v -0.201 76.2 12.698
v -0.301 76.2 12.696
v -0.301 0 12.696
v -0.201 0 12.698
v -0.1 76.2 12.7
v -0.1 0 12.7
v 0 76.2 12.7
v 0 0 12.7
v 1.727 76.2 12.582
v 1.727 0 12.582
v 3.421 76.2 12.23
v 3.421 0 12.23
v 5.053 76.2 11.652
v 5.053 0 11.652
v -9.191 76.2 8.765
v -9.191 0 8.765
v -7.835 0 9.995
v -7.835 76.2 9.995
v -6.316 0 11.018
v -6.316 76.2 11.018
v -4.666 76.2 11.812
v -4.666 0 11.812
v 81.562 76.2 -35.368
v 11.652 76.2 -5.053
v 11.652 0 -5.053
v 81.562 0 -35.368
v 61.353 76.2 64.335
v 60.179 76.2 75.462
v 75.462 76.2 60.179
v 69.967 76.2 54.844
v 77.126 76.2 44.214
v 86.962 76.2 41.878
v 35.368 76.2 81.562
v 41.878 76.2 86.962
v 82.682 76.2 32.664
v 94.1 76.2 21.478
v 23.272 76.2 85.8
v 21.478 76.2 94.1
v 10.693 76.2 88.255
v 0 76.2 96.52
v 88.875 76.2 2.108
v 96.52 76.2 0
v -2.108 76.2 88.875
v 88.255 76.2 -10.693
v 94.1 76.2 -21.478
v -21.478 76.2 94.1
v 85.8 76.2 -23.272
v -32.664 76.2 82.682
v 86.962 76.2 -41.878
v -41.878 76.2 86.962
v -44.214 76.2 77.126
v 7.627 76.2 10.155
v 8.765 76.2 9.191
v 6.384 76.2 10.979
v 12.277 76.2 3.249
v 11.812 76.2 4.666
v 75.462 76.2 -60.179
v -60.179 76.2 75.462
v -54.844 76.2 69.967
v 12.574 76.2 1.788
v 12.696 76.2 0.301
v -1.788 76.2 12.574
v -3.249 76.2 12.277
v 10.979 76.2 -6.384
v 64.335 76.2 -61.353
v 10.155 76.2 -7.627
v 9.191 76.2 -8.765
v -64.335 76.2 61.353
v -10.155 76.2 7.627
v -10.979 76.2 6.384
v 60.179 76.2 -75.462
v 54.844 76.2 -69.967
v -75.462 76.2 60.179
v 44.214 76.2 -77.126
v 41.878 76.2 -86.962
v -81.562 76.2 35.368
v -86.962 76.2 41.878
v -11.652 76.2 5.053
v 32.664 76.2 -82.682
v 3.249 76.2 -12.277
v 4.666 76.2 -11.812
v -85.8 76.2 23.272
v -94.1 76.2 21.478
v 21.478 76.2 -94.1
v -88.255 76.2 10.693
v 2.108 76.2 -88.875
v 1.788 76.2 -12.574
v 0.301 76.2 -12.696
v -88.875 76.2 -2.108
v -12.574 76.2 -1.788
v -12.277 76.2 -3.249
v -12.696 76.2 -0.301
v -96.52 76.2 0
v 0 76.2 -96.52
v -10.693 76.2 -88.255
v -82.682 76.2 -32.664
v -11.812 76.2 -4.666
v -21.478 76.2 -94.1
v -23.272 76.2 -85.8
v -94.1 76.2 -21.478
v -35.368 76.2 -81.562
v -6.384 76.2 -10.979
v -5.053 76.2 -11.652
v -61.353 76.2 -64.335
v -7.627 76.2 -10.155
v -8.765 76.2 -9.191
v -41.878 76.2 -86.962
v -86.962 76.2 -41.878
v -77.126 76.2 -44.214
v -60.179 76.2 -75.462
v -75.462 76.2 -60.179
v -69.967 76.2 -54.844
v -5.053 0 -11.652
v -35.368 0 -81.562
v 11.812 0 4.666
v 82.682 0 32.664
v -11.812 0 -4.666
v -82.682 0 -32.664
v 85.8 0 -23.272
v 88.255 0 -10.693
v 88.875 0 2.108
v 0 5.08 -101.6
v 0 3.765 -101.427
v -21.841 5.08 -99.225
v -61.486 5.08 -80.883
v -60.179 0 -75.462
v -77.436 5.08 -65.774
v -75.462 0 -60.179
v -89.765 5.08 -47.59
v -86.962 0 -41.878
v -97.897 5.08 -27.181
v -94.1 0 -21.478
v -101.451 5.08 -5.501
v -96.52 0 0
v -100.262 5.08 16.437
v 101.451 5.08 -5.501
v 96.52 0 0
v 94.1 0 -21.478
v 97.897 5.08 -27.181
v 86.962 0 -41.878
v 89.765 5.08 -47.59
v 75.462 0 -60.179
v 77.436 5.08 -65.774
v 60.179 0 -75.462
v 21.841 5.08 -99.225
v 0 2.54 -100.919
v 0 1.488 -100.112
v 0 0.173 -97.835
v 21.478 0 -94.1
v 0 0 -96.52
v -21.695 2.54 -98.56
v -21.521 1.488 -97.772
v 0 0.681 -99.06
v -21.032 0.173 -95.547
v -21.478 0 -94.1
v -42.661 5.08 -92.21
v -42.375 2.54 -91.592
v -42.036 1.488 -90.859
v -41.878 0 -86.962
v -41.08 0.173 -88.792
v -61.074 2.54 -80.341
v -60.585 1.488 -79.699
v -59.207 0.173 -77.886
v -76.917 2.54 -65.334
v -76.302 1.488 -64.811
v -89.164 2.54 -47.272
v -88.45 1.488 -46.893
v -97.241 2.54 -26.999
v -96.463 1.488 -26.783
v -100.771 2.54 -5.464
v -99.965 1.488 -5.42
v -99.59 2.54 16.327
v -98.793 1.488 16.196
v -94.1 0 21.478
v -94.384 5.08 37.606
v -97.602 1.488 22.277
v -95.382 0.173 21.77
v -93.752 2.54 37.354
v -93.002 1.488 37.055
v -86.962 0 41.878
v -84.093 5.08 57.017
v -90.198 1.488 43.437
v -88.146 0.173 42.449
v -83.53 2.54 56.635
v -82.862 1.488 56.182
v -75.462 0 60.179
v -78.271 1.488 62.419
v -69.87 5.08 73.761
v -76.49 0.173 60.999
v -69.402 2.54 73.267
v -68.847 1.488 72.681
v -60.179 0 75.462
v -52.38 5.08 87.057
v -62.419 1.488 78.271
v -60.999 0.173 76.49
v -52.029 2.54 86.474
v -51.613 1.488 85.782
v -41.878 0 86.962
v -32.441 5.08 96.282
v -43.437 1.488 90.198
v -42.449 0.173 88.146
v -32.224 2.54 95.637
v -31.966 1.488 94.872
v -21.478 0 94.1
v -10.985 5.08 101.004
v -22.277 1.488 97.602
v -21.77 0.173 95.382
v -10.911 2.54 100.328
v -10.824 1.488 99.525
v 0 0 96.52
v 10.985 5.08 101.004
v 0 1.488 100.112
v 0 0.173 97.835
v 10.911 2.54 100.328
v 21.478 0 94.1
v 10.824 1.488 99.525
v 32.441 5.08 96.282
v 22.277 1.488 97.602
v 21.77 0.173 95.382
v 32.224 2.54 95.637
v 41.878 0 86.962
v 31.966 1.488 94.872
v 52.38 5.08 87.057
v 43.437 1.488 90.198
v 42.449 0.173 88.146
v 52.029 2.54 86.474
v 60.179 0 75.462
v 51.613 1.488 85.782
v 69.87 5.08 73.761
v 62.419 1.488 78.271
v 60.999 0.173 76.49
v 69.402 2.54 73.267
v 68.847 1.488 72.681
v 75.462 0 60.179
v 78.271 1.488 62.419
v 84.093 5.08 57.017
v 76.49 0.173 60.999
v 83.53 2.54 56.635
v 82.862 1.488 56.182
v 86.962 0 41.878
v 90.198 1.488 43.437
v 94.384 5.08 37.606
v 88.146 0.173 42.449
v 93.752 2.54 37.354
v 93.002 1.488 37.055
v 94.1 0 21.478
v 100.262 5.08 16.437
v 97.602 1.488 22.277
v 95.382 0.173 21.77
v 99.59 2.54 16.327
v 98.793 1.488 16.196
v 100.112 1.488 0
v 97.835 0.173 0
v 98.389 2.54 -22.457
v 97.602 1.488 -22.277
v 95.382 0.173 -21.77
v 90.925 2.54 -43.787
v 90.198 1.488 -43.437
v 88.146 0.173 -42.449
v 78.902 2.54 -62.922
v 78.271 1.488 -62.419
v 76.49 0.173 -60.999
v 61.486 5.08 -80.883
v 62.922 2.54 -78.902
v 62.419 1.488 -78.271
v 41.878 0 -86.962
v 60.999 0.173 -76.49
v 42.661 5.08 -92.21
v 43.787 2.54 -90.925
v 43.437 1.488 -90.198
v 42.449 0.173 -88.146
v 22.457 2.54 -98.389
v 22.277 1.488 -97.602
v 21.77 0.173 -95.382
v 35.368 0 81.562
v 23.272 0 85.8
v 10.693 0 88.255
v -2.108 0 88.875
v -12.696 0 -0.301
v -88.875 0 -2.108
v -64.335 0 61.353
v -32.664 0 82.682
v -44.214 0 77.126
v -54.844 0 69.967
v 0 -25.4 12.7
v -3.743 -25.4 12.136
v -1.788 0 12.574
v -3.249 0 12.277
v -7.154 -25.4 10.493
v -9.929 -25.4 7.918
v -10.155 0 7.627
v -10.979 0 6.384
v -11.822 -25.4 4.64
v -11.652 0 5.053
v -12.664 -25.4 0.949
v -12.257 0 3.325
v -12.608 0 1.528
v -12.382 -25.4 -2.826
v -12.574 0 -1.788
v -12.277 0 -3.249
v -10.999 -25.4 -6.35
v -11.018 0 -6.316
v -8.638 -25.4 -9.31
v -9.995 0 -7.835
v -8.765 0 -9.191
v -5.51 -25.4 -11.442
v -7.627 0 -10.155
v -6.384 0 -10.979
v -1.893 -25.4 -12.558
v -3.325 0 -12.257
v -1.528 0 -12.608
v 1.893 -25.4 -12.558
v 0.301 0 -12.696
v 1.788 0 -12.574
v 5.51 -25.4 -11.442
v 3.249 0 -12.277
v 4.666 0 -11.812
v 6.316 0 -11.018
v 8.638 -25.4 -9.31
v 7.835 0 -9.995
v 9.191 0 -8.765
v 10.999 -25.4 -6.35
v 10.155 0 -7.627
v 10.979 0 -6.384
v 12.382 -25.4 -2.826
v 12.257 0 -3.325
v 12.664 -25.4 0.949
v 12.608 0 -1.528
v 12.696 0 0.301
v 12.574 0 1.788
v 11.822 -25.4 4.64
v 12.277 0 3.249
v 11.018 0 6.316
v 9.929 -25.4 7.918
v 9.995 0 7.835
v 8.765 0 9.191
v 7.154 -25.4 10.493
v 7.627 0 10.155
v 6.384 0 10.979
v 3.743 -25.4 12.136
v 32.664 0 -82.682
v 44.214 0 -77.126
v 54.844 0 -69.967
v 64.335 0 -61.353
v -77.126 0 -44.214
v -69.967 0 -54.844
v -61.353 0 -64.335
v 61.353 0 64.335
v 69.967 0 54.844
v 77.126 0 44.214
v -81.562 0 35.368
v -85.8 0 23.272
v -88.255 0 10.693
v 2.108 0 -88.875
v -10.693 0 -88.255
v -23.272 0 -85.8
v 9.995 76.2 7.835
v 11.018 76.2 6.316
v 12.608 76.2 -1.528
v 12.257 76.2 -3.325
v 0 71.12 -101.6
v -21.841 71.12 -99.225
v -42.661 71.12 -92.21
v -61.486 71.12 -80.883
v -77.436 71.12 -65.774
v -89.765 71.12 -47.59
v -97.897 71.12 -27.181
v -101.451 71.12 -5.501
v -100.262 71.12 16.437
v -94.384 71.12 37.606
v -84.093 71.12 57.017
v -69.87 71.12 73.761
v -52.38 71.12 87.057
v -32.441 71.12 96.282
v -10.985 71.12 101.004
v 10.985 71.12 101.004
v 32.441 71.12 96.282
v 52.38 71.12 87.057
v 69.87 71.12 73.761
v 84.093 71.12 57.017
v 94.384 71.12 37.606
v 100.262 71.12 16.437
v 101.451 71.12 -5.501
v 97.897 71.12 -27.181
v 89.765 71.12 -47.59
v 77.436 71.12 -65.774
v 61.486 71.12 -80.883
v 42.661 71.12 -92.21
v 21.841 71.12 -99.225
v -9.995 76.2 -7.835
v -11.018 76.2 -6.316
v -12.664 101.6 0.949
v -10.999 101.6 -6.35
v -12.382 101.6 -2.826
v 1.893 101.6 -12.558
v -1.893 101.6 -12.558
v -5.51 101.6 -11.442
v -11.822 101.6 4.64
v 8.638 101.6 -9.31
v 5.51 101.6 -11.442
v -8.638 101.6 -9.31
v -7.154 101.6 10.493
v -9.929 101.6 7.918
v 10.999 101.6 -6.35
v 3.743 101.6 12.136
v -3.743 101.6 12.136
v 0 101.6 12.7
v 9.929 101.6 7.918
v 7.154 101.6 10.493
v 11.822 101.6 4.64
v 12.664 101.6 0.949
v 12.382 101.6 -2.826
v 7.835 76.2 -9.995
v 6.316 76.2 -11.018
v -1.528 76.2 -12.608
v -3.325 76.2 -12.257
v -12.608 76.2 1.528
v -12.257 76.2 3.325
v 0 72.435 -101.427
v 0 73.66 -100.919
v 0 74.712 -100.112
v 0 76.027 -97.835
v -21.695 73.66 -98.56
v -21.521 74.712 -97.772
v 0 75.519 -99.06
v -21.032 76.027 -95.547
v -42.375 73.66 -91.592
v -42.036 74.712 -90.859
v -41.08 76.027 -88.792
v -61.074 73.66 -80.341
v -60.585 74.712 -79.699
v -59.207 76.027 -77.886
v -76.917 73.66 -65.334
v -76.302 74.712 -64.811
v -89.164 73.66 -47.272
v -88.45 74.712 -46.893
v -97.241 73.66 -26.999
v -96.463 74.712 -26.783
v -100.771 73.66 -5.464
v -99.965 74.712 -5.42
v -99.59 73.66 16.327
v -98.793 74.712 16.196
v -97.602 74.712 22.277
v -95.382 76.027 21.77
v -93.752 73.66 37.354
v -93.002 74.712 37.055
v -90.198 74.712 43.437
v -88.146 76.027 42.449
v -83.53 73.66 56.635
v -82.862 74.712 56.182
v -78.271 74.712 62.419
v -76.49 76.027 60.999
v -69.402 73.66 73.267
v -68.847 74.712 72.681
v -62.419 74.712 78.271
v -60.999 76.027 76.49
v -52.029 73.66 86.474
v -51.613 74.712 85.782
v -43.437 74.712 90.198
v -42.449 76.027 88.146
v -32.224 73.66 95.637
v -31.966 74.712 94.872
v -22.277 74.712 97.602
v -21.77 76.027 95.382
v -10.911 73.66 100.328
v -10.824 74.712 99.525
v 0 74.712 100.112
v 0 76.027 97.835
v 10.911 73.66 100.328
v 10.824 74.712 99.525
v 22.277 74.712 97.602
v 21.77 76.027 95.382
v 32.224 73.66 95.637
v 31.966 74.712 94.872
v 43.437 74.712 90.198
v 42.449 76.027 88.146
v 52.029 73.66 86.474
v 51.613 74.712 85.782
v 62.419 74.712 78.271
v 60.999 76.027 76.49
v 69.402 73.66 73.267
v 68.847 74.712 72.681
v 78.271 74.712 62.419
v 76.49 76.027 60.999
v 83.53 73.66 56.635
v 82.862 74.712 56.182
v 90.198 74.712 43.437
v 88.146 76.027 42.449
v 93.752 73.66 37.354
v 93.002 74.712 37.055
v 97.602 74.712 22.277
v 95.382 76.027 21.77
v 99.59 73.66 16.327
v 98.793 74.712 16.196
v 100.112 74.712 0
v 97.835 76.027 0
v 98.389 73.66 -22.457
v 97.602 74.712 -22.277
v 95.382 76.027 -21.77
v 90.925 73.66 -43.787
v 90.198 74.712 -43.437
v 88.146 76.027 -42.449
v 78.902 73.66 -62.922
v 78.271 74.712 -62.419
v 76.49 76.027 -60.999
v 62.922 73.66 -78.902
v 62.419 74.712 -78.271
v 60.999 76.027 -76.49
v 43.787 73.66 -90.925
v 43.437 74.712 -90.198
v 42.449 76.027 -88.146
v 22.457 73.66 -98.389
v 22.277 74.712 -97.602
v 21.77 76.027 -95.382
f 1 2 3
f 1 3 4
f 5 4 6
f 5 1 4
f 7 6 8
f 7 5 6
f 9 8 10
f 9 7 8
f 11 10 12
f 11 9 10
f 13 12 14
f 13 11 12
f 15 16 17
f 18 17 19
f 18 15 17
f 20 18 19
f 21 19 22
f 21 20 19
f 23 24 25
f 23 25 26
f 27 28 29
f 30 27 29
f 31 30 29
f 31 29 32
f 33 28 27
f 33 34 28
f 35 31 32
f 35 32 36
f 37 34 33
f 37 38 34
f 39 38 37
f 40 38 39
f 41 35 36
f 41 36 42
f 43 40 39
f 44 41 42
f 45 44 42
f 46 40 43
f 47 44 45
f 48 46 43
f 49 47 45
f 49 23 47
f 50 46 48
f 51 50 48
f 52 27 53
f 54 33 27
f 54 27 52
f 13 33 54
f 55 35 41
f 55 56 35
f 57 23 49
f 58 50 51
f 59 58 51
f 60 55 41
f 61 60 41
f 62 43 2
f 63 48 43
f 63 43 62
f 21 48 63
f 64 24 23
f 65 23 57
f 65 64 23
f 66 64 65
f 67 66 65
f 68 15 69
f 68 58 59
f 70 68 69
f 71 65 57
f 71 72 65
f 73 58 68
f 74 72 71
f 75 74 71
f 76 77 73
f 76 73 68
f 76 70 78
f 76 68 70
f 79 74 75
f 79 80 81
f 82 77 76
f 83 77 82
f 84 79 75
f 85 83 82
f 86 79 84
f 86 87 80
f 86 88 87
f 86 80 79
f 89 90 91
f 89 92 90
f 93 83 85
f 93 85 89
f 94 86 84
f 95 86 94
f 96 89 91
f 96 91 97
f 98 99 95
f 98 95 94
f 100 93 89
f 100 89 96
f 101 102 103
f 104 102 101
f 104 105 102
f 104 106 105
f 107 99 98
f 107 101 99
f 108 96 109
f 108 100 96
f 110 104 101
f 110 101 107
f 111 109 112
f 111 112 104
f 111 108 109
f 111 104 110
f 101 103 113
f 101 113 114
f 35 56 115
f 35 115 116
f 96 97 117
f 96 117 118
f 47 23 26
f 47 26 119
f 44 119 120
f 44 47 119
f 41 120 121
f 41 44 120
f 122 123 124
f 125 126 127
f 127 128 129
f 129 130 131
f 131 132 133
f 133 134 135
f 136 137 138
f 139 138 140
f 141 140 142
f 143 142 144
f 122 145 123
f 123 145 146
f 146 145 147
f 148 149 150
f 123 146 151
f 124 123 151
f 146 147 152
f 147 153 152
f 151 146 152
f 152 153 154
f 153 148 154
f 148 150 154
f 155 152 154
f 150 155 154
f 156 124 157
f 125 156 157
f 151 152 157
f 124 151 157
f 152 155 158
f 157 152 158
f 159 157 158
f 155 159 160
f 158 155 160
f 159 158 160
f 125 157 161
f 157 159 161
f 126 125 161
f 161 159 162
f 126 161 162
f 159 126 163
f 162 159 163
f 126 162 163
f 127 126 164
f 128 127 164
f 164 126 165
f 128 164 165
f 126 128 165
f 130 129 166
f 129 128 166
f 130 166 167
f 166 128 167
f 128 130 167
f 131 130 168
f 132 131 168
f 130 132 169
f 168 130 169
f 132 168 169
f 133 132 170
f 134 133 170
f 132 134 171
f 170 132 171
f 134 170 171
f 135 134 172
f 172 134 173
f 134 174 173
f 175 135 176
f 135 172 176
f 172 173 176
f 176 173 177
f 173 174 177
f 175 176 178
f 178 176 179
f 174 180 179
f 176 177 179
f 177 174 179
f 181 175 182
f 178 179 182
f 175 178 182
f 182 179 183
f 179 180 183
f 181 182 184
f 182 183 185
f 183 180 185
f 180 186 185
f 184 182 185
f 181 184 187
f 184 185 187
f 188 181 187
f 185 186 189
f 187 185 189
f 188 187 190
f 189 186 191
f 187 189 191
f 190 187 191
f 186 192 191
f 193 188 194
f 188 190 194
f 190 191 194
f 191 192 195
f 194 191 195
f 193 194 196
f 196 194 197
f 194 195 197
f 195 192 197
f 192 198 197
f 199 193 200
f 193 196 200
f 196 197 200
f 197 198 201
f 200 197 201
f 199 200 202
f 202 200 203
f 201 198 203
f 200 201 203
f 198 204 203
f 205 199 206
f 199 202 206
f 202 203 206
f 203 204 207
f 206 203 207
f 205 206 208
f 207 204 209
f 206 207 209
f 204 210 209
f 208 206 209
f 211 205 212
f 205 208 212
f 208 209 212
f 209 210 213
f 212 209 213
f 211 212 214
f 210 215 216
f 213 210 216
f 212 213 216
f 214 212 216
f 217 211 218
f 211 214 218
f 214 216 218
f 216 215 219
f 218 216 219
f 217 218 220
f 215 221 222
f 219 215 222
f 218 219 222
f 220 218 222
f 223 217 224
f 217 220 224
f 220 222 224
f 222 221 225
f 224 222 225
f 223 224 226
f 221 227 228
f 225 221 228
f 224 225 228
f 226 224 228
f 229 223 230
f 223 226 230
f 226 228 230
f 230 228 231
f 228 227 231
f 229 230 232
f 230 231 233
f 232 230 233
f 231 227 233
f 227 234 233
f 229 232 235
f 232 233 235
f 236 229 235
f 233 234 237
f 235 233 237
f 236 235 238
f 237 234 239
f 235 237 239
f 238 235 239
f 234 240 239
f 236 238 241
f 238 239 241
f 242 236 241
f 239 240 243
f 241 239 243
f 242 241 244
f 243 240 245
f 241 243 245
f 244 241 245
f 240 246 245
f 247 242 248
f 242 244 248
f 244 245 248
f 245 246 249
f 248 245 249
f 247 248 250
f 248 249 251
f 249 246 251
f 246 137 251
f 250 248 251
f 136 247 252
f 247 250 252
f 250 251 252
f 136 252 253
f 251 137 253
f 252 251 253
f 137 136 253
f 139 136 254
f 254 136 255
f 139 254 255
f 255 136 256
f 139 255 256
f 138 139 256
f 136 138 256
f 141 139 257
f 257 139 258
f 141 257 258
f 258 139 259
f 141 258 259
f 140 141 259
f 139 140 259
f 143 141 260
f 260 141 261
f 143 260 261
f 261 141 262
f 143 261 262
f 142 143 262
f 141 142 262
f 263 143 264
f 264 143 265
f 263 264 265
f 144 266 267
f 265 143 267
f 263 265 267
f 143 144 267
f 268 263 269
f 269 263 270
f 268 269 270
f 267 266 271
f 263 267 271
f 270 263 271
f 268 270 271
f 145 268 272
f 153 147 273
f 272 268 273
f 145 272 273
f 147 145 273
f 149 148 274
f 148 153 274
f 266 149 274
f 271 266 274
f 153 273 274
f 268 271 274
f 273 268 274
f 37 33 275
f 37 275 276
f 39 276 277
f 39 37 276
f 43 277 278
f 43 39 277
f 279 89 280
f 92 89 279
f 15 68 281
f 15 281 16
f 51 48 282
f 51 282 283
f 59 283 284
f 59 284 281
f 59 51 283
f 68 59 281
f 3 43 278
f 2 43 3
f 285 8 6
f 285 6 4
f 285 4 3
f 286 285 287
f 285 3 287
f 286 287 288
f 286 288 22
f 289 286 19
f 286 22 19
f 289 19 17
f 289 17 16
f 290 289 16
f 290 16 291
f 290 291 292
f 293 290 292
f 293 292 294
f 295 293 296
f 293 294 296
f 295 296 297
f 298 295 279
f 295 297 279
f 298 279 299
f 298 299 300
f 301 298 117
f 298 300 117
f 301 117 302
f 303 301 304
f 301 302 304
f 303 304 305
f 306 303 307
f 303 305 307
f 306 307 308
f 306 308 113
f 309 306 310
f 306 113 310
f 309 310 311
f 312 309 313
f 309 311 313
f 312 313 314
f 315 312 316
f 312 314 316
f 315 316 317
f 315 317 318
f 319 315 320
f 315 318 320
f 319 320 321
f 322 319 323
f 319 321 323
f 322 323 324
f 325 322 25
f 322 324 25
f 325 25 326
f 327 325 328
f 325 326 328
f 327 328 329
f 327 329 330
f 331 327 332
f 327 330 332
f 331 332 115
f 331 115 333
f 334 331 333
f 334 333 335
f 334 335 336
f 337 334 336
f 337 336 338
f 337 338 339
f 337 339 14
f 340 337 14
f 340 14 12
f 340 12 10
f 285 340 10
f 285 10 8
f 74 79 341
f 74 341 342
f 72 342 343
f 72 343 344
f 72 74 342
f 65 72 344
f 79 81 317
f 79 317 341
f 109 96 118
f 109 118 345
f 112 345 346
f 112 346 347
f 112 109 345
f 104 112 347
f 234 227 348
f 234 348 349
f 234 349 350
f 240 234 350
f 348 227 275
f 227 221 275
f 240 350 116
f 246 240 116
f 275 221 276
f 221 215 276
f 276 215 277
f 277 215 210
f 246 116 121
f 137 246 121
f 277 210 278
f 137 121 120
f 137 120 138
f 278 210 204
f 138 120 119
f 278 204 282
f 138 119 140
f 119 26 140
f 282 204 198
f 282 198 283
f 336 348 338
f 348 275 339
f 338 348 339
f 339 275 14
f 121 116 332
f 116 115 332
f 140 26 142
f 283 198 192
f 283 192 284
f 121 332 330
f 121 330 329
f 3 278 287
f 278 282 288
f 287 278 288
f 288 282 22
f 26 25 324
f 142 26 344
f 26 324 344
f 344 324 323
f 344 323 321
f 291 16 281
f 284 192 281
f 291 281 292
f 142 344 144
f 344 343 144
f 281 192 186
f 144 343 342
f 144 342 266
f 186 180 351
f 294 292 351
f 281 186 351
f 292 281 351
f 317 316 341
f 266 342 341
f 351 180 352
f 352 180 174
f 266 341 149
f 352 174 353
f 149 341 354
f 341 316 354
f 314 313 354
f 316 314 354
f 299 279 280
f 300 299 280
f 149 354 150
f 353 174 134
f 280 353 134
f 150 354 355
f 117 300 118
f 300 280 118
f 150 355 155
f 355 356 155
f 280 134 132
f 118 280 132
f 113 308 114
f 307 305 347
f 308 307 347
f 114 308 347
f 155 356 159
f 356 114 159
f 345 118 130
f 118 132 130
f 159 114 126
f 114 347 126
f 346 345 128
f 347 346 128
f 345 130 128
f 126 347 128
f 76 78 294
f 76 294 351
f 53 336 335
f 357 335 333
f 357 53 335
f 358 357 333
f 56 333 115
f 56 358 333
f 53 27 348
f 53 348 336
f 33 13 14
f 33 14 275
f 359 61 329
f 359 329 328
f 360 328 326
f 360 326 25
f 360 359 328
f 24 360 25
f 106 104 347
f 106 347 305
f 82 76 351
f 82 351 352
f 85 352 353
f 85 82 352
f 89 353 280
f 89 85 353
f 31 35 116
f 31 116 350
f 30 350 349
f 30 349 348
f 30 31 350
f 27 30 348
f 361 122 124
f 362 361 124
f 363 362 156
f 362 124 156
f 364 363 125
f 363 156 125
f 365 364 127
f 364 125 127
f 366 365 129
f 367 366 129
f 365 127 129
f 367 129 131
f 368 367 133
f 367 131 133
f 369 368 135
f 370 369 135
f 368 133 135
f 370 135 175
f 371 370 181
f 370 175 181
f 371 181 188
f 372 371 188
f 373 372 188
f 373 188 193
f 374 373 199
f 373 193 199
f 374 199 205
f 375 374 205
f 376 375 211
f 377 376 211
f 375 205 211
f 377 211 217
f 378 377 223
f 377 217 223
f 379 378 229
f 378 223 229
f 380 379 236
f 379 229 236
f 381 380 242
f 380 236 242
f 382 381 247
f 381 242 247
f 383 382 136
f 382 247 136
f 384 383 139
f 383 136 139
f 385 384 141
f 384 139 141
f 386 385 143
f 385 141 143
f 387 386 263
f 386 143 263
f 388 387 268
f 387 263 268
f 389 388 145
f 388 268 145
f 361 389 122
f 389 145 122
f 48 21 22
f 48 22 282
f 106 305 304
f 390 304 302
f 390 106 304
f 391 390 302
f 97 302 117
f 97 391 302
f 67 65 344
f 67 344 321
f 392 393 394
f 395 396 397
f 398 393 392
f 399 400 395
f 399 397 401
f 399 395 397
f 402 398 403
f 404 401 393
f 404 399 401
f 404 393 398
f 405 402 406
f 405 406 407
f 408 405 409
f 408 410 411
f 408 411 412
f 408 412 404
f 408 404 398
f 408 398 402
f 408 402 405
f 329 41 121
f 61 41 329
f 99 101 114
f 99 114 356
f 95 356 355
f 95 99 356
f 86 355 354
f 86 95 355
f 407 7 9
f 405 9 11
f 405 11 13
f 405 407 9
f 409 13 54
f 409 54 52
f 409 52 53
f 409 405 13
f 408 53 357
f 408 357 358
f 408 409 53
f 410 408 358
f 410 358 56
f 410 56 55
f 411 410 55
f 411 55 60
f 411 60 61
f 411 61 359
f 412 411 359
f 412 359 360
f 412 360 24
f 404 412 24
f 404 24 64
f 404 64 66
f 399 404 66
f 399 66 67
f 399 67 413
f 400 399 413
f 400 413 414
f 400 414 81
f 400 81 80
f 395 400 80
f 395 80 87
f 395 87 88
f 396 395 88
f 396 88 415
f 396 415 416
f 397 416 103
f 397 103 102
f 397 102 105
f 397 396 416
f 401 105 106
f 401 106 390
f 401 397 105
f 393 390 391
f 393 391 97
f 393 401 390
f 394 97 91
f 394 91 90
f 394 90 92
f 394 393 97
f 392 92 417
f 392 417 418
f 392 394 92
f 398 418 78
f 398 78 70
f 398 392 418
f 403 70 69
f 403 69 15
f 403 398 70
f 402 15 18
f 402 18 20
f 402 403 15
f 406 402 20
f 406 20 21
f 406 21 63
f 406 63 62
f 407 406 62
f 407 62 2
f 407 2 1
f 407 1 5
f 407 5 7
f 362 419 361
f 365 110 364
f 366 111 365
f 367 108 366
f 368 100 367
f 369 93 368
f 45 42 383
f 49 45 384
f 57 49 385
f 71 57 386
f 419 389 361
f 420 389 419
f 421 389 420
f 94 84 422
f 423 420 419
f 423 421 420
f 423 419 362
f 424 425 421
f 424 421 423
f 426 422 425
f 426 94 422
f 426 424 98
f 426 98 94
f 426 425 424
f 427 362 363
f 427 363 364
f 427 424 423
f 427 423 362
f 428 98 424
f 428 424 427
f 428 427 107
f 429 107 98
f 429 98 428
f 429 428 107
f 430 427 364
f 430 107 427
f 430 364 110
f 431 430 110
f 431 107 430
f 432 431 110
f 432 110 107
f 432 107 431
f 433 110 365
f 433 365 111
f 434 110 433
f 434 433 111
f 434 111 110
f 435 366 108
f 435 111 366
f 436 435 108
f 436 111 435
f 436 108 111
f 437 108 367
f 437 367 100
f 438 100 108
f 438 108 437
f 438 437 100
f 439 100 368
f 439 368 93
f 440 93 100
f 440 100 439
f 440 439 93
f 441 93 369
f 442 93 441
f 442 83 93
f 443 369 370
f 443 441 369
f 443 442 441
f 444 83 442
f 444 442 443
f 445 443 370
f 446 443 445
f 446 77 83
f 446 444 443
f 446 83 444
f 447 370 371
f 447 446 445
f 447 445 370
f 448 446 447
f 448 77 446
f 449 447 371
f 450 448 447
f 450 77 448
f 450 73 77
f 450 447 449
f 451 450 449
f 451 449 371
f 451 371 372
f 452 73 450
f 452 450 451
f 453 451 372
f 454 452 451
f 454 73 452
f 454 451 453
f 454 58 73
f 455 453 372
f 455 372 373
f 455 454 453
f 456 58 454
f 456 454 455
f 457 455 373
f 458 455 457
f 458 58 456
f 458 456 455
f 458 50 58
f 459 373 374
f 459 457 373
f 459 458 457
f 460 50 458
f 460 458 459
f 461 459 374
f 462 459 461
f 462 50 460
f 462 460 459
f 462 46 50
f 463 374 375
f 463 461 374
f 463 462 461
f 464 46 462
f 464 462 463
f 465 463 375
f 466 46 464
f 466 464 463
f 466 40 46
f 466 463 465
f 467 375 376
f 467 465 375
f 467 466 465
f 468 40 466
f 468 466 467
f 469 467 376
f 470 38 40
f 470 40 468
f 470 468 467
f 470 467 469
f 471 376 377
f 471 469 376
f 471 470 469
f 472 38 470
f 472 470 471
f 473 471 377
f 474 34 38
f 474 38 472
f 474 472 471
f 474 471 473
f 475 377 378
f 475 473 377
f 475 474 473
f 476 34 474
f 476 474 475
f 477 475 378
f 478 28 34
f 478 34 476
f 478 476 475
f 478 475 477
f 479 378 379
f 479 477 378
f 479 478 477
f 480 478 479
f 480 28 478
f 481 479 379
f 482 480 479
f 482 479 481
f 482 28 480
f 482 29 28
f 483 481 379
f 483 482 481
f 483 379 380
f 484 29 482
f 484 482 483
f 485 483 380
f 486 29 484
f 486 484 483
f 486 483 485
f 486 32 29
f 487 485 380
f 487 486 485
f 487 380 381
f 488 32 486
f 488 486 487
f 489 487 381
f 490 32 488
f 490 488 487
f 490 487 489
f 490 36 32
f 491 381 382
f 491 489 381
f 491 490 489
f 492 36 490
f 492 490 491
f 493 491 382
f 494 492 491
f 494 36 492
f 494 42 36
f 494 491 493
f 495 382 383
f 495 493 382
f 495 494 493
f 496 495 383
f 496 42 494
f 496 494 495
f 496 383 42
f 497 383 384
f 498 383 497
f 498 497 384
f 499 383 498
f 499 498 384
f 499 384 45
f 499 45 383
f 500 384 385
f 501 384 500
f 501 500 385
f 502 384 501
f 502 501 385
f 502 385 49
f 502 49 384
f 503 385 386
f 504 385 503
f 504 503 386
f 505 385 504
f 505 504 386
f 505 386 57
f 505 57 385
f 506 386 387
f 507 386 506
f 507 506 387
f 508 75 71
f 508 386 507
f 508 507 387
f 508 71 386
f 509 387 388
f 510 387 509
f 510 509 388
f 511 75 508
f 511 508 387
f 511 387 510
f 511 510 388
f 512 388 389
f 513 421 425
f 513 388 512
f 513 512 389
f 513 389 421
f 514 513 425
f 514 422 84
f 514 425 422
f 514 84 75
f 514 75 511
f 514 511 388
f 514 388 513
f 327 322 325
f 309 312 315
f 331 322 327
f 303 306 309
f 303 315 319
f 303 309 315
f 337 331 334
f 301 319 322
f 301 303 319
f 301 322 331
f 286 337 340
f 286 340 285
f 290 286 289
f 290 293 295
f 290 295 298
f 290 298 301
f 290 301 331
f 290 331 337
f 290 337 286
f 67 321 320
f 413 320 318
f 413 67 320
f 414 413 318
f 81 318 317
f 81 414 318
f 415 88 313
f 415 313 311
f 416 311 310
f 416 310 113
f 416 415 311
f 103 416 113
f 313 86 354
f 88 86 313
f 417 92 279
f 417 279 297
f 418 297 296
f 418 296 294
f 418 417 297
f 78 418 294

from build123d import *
from build123d.topology import SkipClean

# Parameters (mm, degrees)
SKETCH2_R           = 101.6
BOSS_EXTRUDE1_DEPTH = 76.2
SKETCH4_R           = 12.7
BOSS_EXTRUDE4_DEPTH = 25.4
FILLET1_R           = 5.08
FILLET2_R           = 5.08
CUT_EXTRUDE2_START  = -76.2
CUT_EXTRUDE2_DEPTH  = 76.2
BOSS_EXTRUDE5_START = 25.4
SKETCH8_R           = 12.7
BOSS_EXTRUDE5_DEPTH = 25.4


with BuildPart() as part:
    # Sketch2 → Boss-Extrude1 (new body)
    with BuildSketch(Plane(origin=(0, 0, 0), x_dir=(1, 0, 0), z_dir=(0, 1, 0))):
        Circle(SKETCH2_R)
    extrude(amount=BOSS_EXTRUDE1_DEPTH)

    # Sketch4 → Boss-Extrude4 (add)
    with BuildSketch(Plane(origin=(0, 0, 0), x_dir=(-1, 0, 0), z_dir=(0, -1, 0))):
        Circle(SKETCH4_R)
    extrude(amount=BOSS_EXTRUDE4_DEPTH)

    # Fillet1
    fillet1_edges = [part.edges().sort_by_distance(p)[0] for p in [
        (-101.6, 76.2, 0),
    ]]
    fillet(fillet1_edges, radius=FILLET1_R)

    # Fillet2
    fillet2_edges = [part.edges().sort_by_distance(p)[0] for p in [
        (-101.6, 0, 0),
    ]]
    fillet(fillet2_edges, radius=FILLET2_R)

    # Sketch7 → Cut-Extrude2 (cut)
    with SkipClean():  # the faces are left unmerged after this step: merging them gives an invalid solid
        with BuildSketch(Plane.XZ.offset(CUT_EXTRUDE2_START)):
            with BuildLine():
                ThreePointArc((12.696427962, 0.301192634), (12.464886183, -2.432408777), (11.651702143, -5.052508009))
                Line((11.651702143, -5.052508009), (81.561914999, -35.367556061))
                ThreePointArc((81.561914999, -35.367556061), (87.254203278, -17.026861437), (88.874995735, 2.108348439))
                Line((88.874995735, 2.108348439), (12.696427962, 0.301192634))
            make_face()
            with BuildLine():
                Line((64.33493964, -61.353284684), (9.190705663, -8.764754955))
                ThreePointArc((9.190705663, -8.764754955), (7.094032806, -10.533978287), (4.666334922, -11.811660272))
                Line((4.666334922, -11.811660272), (32.664344457, -82.681621907))
                ThreePointArc((32.664344457, -82.681621907), (49.658229641, -73.737848009), (64.33493964, -61.353284684))
            make_face()
            with BuildLine():
                Line((2.108348439, -88.874995735), (0.301192634, -12.696427962))
                ThreePointArc((0.301192634, -12.696427962), (-2.432408777, -12.464886183), (-5.052508009, -11.651702143))
                Line((-5.052508009, -11.651702143), (-35.367556061, -81.561914999))
                ThreePointArc((-35.367556061, -81.561914999), (-17.026861437, -87.254203278), (2.108348439, -88.874995735))
            make_face()
            with BuildLine():
                Line((-61.353284684, -64.33493964), (-8.764754955, -9.190705663))
                ThreePointArc((-8.764754955, -9.190705663), (-10.533978287, -7.094032806), (-11.811660272, -4.666334922))
                Line((-11.811660272, -4.666334922), (-82.681621907, -32.664344457))
                ThreePointArc((-82.681621907, -32.664344457), (-73.737848009, -49.658229641), (-61.353284684, -64.33493964))
            make_face()
            with BuildLine():
                Line((-88.874995735, -2.108348439), (-12.696427962, -0.301192634))
                ThreePointArc((-12.696427962, -0.301192634), (-12.464886183, 2.432408777), (-11.651702143, 5.052508009))
                Line((-11.651702143, 5.052508009), (-81.561914999, 35.367556061))
                ThreePointArc((-81.561914999, 35.367556061), (-87.254203278, 17.026861437), (-88.874995735, -2.108348439))
            make_face()
            with BuildLine():
                Line((-64.33493964, 61.353284684), (-9.190705663, 8.764754955))
                ThreePointArc((-9.190705663, 8.764754955), (-7.094032806, 10.533978287), (-4.666334922, 11.811660272))
                Line((-4.666334922, 11.811660272), (-32.664344457, 82.681621907))
                ThreePointArc((-32.664344457, 82.681621907), (-49.658229641, 73.737848009), (-64.33493964, 61.353284684))
            make_face()
            with BuildLine():
                Line((-2.108348439, 88.874995735), (-0.301192634, 12.696427962))
                ThreePointArc((-0.301192634, 12.696427962), (2.432408777, 12.464886183), (5.052508009, 11.651702143))
                Line((5.052508009, 11.651702143), (35.367556061, 81.561914999))
                ThreePointArc((35.367556061, 81.561914999), (17.026861437, 87.254203278), (-2.108348439, 88.874995735))
            make_face()
            with BuildLine():
                Line((61.353284684, 64.33493964), (8.764754955, 9.190705663))
                ThreePointArc((8.764754955, 9.190705663), (10.533978287, 7.094032806), (11.811660272, 4.666334922))
                Line((11.811660272, 4.666334922), (82.681621907, 32.664344457))
                ThreePointArc((82.681621907, 32.664344457), (73.737848009, 49.658229641), (61.353284684, 64.33493964))
            make_face()
        extrude(amount=CUT_EXTRUDE2_DEPTH, mode=Mode.SUBTRACT)

    # Sketch8 → Boss-Extrude5 (add)
    with SkipClean():  # the faces are left unmerged after this step: merging them gives an invalid solid
        with BuildSketch(Plane(origin=(0, 76.2, 0), x_dir=(1, 0, 0), z_dir=(0, 1, 0)).offset(BOSS_EXTRUDE5_START)):
            Circle(SKETCH8_R)
        extrude(amount=-BOSS_EXTRUDE5_DEPTH)


solid = part.part
